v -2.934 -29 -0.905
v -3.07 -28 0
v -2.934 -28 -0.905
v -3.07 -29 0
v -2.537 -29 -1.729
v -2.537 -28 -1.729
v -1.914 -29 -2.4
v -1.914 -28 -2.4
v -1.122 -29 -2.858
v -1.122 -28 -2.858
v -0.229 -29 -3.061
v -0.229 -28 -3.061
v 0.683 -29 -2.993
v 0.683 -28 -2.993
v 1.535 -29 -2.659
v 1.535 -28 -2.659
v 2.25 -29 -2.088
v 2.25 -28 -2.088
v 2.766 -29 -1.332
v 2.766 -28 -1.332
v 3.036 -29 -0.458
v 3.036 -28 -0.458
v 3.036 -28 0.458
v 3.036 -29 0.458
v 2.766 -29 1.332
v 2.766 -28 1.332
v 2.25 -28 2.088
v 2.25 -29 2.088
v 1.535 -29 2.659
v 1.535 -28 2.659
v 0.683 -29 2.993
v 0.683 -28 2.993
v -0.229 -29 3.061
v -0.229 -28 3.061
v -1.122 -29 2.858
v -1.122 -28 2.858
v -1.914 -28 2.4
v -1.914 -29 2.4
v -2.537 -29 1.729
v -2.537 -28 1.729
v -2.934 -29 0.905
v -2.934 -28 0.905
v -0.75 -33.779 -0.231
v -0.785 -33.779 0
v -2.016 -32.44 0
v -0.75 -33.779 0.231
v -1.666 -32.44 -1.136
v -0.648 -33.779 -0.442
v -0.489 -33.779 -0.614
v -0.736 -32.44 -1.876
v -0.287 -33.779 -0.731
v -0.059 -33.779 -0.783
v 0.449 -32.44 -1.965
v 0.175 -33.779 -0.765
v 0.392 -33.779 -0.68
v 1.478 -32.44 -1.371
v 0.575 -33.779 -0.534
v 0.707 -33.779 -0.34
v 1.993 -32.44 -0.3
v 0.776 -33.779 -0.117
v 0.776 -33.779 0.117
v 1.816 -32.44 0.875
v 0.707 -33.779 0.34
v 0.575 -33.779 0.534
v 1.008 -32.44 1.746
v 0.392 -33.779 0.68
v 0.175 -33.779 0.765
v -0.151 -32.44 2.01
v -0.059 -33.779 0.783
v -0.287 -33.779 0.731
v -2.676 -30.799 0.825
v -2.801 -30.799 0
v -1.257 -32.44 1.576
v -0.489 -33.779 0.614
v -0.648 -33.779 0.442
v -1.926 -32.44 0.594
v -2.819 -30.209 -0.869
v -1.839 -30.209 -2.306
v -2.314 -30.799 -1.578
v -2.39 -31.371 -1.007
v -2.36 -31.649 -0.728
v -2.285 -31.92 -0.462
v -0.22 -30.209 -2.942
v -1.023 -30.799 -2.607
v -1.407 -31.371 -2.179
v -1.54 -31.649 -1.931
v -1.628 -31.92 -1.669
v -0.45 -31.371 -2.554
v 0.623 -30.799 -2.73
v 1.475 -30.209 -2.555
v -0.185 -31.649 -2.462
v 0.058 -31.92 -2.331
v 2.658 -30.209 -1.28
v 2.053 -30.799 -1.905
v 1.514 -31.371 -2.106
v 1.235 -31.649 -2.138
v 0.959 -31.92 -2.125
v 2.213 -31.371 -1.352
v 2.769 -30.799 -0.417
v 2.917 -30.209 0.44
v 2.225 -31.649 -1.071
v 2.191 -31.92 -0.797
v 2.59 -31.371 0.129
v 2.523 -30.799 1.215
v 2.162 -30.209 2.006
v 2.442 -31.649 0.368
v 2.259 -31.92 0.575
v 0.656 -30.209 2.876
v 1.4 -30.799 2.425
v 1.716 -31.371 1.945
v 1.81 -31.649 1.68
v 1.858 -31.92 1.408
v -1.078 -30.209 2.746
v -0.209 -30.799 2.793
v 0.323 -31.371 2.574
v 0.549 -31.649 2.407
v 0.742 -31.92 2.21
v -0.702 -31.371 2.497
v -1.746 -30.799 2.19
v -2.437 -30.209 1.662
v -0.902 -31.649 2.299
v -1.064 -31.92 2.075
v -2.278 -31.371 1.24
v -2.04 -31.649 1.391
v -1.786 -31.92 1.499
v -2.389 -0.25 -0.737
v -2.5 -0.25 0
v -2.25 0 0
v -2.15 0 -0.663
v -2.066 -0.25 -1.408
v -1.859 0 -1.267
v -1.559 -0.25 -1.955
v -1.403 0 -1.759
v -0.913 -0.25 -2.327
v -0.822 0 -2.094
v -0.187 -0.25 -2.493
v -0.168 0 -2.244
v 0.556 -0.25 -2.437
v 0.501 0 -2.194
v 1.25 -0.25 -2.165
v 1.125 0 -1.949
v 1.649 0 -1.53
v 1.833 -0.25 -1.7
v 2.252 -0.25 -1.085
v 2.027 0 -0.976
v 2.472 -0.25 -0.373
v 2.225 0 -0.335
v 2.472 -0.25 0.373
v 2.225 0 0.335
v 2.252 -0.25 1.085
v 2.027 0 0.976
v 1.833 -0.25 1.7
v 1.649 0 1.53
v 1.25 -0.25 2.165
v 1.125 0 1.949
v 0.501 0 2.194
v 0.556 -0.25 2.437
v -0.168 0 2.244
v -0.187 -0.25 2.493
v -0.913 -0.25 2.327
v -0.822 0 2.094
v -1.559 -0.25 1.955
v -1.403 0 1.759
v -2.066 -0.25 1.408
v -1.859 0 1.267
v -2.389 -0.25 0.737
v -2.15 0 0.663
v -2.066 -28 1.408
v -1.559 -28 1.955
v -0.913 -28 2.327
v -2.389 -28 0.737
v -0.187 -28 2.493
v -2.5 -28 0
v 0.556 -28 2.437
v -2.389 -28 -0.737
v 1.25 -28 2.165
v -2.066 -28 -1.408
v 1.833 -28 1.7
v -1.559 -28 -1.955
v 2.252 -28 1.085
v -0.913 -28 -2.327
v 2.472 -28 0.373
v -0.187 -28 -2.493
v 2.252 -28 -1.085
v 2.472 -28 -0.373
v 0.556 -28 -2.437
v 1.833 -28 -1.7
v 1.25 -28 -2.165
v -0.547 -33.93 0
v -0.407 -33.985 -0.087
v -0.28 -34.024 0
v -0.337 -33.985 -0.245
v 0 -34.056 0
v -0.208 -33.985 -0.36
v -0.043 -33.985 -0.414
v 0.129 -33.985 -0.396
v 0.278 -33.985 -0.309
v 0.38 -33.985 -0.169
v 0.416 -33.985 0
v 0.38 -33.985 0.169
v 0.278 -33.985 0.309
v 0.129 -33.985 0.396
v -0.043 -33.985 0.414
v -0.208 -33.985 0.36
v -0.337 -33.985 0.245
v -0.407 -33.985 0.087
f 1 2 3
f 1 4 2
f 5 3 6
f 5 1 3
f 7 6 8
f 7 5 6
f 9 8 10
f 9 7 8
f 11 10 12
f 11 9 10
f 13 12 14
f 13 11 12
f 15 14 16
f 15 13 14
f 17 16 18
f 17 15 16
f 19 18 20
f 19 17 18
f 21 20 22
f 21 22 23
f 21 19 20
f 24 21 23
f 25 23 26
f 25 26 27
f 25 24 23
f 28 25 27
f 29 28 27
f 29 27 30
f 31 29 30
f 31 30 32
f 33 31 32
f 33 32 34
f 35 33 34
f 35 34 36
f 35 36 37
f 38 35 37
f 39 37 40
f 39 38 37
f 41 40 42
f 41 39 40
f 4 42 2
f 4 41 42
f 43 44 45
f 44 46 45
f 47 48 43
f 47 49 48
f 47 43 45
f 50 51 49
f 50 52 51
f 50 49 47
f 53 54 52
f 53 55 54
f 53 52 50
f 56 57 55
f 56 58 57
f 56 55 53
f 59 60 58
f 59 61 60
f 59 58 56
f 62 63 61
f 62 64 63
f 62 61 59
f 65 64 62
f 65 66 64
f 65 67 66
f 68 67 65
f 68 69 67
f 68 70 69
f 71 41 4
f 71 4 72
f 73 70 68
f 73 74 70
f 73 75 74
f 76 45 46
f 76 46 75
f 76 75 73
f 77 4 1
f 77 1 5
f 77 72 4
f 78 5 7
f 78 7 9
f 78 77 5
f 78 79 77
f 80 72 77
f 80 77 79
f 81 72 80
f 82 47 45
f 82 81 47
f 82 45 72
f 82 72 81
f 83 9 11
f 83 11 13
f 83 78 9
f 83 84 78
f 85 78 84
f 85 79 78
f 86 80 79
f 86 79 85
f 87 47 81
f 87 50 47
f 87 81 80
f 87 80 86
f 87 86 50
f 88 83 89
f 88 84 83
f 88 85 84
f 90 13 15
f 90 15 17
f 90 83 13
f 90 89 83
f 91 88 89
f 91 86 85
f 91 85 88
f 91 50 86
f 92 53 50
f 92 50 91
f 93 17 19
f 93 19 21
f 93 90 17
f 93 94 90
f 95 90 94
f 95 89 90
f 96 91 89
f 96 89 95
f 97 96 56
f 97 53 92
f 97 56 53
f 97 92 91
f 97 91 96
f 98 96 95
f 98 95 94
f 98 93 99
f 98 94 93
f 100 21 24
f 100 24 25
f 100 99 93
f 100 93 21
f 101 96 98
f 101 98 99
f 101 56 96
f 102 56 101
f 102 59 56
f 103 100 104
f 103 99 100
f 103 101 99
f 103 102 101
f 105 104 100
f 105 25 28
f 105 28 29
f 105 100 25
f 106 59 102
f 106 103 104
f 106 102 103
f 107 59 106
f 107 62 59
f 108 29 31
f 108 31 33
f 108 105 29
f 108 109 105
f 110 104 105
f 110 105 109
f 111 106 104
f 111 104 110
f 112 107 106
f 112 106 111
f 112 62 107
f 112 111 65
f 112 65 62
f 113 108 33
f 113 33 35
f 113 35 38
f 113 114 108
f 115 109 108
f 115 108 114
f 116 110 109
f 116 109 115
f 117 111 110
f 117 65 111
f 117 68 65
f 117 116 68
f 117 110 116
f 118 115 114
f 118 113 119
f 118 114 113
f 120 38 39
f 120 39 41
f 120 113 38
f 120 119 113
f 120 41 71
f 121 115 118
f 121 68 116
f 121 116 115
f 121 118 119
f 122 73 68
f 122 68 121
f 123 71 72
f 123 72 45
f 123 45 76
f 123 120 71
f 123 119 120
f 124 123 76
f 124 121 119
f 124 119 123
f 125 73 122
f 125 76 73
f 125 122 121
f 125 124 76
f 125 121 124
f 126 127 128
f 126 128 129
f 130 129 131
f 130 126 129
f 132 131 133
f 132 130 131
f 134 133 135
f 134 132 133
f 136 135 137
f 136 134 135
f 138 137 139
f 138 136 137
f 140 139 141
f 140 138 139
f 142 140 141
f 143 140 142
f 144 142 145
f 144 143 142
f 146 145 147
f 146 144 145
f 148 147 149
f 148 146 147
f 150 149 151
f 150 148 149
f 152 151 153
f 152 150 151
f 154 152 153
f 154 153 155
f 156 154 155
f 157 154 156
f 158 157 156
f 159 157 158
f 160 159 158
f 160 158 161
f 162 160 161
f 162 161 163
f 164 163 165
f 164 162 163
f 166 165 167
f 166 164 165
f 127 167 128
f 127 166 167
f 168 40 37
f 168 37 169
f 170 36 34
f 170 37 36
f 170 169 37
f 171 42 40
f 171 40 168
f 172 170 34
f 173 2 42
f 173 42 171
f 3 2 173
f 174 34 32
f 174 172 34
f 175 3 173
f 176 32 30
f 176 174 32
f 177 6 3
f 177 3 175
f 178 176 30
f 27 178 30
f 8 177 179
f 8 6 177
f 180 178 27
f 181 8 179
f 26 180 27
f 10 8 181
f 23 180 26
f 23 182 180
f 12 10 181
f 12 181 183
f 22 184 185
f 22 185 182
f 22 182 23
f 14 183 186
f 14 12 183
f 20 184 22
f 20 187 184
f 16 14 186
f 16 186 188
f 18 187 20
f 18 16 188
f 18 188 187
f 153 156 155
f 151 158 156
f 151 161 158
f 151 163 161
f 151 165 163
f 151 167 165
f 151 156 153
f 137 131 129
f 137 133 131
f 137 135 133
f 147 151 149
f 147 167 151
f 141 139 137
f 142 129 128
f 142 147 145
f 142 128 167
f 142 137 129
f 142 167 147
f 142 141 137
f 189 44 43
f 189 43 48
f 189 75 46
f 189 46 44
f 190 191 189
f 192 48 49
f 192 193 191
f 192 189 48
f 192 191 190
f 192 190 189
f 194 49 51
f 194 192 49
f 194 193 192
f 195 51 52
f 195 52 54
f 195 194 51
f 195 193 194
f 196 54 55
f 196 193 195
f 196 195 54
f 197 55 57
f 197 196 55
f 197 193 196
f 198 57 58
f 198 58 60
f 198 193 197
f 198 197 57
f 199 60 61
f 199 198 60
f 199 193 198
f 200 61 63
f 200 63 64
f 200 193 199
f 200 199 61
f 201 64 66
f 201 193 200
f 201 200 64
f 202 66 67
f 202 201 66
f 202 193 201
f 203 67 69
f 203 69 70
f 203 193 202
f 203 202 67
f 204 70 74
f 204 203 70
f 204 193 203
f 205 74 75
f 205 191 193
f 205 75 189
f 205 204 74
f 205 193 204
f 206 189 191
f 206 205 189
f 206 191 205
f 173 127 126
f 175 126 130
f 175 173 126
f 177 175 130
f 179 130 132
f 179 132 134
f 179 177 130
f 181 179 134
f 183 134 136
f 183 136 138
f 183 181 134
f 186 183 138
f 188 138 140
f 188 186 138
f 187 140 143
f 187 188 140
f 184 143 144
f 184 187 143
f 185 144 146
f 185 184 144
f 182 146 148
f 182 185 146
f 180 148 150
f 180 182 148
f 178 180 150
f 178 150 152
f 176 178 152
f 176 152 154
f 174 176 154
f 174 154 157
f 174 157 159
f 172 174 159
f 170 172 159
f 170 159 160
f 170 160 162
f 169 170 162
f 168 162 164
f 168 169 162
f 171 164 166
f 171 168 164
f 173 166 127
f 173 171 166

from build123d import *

# Parameters (mm, degrees)
CHAMFER1_SIZE = 0.25


with BuildPart() as part:
    # Sketch1 → Revolve1 (revolve)
    with BuildSketch(Plane.XY, mode=Mode.PRIVATE) as revolve1_sk:
        with BuildLine():
            Line((0, 0), (2.5, 0))
            Line((2.5, 0), (2.5, -28))
            Line((2.5, -28), (3.07, -28))
            Line((3.07, -28), (3.07, -29))
            ThreePointArc((3.07, -29), (2.469307539, -31.648711382), (0.784764826, -33.779161865))
            ThreePointArc((0.784764826, -33.779161865), (0.416115665, -33.984911425), (0, -34.05620546))
            Line((0, -34.05620546), (0, 0))
        make_face()
    revolve(revolve1_sk.sketch.rotate(Axis((0, 0, 0), (0, -1, 0)), 180), axis=Axis((0, 0, 0), (0, -1, 0)))

    # Chamfer1
    chamfer1_edges = [part.edges().sort_by_distance(p)[0] for p in [
        (2.5, 0, 0),
    ]]
    chamfer(chamfer1_edges, length=CHAMFER1_SIZE)


solid = part.part
